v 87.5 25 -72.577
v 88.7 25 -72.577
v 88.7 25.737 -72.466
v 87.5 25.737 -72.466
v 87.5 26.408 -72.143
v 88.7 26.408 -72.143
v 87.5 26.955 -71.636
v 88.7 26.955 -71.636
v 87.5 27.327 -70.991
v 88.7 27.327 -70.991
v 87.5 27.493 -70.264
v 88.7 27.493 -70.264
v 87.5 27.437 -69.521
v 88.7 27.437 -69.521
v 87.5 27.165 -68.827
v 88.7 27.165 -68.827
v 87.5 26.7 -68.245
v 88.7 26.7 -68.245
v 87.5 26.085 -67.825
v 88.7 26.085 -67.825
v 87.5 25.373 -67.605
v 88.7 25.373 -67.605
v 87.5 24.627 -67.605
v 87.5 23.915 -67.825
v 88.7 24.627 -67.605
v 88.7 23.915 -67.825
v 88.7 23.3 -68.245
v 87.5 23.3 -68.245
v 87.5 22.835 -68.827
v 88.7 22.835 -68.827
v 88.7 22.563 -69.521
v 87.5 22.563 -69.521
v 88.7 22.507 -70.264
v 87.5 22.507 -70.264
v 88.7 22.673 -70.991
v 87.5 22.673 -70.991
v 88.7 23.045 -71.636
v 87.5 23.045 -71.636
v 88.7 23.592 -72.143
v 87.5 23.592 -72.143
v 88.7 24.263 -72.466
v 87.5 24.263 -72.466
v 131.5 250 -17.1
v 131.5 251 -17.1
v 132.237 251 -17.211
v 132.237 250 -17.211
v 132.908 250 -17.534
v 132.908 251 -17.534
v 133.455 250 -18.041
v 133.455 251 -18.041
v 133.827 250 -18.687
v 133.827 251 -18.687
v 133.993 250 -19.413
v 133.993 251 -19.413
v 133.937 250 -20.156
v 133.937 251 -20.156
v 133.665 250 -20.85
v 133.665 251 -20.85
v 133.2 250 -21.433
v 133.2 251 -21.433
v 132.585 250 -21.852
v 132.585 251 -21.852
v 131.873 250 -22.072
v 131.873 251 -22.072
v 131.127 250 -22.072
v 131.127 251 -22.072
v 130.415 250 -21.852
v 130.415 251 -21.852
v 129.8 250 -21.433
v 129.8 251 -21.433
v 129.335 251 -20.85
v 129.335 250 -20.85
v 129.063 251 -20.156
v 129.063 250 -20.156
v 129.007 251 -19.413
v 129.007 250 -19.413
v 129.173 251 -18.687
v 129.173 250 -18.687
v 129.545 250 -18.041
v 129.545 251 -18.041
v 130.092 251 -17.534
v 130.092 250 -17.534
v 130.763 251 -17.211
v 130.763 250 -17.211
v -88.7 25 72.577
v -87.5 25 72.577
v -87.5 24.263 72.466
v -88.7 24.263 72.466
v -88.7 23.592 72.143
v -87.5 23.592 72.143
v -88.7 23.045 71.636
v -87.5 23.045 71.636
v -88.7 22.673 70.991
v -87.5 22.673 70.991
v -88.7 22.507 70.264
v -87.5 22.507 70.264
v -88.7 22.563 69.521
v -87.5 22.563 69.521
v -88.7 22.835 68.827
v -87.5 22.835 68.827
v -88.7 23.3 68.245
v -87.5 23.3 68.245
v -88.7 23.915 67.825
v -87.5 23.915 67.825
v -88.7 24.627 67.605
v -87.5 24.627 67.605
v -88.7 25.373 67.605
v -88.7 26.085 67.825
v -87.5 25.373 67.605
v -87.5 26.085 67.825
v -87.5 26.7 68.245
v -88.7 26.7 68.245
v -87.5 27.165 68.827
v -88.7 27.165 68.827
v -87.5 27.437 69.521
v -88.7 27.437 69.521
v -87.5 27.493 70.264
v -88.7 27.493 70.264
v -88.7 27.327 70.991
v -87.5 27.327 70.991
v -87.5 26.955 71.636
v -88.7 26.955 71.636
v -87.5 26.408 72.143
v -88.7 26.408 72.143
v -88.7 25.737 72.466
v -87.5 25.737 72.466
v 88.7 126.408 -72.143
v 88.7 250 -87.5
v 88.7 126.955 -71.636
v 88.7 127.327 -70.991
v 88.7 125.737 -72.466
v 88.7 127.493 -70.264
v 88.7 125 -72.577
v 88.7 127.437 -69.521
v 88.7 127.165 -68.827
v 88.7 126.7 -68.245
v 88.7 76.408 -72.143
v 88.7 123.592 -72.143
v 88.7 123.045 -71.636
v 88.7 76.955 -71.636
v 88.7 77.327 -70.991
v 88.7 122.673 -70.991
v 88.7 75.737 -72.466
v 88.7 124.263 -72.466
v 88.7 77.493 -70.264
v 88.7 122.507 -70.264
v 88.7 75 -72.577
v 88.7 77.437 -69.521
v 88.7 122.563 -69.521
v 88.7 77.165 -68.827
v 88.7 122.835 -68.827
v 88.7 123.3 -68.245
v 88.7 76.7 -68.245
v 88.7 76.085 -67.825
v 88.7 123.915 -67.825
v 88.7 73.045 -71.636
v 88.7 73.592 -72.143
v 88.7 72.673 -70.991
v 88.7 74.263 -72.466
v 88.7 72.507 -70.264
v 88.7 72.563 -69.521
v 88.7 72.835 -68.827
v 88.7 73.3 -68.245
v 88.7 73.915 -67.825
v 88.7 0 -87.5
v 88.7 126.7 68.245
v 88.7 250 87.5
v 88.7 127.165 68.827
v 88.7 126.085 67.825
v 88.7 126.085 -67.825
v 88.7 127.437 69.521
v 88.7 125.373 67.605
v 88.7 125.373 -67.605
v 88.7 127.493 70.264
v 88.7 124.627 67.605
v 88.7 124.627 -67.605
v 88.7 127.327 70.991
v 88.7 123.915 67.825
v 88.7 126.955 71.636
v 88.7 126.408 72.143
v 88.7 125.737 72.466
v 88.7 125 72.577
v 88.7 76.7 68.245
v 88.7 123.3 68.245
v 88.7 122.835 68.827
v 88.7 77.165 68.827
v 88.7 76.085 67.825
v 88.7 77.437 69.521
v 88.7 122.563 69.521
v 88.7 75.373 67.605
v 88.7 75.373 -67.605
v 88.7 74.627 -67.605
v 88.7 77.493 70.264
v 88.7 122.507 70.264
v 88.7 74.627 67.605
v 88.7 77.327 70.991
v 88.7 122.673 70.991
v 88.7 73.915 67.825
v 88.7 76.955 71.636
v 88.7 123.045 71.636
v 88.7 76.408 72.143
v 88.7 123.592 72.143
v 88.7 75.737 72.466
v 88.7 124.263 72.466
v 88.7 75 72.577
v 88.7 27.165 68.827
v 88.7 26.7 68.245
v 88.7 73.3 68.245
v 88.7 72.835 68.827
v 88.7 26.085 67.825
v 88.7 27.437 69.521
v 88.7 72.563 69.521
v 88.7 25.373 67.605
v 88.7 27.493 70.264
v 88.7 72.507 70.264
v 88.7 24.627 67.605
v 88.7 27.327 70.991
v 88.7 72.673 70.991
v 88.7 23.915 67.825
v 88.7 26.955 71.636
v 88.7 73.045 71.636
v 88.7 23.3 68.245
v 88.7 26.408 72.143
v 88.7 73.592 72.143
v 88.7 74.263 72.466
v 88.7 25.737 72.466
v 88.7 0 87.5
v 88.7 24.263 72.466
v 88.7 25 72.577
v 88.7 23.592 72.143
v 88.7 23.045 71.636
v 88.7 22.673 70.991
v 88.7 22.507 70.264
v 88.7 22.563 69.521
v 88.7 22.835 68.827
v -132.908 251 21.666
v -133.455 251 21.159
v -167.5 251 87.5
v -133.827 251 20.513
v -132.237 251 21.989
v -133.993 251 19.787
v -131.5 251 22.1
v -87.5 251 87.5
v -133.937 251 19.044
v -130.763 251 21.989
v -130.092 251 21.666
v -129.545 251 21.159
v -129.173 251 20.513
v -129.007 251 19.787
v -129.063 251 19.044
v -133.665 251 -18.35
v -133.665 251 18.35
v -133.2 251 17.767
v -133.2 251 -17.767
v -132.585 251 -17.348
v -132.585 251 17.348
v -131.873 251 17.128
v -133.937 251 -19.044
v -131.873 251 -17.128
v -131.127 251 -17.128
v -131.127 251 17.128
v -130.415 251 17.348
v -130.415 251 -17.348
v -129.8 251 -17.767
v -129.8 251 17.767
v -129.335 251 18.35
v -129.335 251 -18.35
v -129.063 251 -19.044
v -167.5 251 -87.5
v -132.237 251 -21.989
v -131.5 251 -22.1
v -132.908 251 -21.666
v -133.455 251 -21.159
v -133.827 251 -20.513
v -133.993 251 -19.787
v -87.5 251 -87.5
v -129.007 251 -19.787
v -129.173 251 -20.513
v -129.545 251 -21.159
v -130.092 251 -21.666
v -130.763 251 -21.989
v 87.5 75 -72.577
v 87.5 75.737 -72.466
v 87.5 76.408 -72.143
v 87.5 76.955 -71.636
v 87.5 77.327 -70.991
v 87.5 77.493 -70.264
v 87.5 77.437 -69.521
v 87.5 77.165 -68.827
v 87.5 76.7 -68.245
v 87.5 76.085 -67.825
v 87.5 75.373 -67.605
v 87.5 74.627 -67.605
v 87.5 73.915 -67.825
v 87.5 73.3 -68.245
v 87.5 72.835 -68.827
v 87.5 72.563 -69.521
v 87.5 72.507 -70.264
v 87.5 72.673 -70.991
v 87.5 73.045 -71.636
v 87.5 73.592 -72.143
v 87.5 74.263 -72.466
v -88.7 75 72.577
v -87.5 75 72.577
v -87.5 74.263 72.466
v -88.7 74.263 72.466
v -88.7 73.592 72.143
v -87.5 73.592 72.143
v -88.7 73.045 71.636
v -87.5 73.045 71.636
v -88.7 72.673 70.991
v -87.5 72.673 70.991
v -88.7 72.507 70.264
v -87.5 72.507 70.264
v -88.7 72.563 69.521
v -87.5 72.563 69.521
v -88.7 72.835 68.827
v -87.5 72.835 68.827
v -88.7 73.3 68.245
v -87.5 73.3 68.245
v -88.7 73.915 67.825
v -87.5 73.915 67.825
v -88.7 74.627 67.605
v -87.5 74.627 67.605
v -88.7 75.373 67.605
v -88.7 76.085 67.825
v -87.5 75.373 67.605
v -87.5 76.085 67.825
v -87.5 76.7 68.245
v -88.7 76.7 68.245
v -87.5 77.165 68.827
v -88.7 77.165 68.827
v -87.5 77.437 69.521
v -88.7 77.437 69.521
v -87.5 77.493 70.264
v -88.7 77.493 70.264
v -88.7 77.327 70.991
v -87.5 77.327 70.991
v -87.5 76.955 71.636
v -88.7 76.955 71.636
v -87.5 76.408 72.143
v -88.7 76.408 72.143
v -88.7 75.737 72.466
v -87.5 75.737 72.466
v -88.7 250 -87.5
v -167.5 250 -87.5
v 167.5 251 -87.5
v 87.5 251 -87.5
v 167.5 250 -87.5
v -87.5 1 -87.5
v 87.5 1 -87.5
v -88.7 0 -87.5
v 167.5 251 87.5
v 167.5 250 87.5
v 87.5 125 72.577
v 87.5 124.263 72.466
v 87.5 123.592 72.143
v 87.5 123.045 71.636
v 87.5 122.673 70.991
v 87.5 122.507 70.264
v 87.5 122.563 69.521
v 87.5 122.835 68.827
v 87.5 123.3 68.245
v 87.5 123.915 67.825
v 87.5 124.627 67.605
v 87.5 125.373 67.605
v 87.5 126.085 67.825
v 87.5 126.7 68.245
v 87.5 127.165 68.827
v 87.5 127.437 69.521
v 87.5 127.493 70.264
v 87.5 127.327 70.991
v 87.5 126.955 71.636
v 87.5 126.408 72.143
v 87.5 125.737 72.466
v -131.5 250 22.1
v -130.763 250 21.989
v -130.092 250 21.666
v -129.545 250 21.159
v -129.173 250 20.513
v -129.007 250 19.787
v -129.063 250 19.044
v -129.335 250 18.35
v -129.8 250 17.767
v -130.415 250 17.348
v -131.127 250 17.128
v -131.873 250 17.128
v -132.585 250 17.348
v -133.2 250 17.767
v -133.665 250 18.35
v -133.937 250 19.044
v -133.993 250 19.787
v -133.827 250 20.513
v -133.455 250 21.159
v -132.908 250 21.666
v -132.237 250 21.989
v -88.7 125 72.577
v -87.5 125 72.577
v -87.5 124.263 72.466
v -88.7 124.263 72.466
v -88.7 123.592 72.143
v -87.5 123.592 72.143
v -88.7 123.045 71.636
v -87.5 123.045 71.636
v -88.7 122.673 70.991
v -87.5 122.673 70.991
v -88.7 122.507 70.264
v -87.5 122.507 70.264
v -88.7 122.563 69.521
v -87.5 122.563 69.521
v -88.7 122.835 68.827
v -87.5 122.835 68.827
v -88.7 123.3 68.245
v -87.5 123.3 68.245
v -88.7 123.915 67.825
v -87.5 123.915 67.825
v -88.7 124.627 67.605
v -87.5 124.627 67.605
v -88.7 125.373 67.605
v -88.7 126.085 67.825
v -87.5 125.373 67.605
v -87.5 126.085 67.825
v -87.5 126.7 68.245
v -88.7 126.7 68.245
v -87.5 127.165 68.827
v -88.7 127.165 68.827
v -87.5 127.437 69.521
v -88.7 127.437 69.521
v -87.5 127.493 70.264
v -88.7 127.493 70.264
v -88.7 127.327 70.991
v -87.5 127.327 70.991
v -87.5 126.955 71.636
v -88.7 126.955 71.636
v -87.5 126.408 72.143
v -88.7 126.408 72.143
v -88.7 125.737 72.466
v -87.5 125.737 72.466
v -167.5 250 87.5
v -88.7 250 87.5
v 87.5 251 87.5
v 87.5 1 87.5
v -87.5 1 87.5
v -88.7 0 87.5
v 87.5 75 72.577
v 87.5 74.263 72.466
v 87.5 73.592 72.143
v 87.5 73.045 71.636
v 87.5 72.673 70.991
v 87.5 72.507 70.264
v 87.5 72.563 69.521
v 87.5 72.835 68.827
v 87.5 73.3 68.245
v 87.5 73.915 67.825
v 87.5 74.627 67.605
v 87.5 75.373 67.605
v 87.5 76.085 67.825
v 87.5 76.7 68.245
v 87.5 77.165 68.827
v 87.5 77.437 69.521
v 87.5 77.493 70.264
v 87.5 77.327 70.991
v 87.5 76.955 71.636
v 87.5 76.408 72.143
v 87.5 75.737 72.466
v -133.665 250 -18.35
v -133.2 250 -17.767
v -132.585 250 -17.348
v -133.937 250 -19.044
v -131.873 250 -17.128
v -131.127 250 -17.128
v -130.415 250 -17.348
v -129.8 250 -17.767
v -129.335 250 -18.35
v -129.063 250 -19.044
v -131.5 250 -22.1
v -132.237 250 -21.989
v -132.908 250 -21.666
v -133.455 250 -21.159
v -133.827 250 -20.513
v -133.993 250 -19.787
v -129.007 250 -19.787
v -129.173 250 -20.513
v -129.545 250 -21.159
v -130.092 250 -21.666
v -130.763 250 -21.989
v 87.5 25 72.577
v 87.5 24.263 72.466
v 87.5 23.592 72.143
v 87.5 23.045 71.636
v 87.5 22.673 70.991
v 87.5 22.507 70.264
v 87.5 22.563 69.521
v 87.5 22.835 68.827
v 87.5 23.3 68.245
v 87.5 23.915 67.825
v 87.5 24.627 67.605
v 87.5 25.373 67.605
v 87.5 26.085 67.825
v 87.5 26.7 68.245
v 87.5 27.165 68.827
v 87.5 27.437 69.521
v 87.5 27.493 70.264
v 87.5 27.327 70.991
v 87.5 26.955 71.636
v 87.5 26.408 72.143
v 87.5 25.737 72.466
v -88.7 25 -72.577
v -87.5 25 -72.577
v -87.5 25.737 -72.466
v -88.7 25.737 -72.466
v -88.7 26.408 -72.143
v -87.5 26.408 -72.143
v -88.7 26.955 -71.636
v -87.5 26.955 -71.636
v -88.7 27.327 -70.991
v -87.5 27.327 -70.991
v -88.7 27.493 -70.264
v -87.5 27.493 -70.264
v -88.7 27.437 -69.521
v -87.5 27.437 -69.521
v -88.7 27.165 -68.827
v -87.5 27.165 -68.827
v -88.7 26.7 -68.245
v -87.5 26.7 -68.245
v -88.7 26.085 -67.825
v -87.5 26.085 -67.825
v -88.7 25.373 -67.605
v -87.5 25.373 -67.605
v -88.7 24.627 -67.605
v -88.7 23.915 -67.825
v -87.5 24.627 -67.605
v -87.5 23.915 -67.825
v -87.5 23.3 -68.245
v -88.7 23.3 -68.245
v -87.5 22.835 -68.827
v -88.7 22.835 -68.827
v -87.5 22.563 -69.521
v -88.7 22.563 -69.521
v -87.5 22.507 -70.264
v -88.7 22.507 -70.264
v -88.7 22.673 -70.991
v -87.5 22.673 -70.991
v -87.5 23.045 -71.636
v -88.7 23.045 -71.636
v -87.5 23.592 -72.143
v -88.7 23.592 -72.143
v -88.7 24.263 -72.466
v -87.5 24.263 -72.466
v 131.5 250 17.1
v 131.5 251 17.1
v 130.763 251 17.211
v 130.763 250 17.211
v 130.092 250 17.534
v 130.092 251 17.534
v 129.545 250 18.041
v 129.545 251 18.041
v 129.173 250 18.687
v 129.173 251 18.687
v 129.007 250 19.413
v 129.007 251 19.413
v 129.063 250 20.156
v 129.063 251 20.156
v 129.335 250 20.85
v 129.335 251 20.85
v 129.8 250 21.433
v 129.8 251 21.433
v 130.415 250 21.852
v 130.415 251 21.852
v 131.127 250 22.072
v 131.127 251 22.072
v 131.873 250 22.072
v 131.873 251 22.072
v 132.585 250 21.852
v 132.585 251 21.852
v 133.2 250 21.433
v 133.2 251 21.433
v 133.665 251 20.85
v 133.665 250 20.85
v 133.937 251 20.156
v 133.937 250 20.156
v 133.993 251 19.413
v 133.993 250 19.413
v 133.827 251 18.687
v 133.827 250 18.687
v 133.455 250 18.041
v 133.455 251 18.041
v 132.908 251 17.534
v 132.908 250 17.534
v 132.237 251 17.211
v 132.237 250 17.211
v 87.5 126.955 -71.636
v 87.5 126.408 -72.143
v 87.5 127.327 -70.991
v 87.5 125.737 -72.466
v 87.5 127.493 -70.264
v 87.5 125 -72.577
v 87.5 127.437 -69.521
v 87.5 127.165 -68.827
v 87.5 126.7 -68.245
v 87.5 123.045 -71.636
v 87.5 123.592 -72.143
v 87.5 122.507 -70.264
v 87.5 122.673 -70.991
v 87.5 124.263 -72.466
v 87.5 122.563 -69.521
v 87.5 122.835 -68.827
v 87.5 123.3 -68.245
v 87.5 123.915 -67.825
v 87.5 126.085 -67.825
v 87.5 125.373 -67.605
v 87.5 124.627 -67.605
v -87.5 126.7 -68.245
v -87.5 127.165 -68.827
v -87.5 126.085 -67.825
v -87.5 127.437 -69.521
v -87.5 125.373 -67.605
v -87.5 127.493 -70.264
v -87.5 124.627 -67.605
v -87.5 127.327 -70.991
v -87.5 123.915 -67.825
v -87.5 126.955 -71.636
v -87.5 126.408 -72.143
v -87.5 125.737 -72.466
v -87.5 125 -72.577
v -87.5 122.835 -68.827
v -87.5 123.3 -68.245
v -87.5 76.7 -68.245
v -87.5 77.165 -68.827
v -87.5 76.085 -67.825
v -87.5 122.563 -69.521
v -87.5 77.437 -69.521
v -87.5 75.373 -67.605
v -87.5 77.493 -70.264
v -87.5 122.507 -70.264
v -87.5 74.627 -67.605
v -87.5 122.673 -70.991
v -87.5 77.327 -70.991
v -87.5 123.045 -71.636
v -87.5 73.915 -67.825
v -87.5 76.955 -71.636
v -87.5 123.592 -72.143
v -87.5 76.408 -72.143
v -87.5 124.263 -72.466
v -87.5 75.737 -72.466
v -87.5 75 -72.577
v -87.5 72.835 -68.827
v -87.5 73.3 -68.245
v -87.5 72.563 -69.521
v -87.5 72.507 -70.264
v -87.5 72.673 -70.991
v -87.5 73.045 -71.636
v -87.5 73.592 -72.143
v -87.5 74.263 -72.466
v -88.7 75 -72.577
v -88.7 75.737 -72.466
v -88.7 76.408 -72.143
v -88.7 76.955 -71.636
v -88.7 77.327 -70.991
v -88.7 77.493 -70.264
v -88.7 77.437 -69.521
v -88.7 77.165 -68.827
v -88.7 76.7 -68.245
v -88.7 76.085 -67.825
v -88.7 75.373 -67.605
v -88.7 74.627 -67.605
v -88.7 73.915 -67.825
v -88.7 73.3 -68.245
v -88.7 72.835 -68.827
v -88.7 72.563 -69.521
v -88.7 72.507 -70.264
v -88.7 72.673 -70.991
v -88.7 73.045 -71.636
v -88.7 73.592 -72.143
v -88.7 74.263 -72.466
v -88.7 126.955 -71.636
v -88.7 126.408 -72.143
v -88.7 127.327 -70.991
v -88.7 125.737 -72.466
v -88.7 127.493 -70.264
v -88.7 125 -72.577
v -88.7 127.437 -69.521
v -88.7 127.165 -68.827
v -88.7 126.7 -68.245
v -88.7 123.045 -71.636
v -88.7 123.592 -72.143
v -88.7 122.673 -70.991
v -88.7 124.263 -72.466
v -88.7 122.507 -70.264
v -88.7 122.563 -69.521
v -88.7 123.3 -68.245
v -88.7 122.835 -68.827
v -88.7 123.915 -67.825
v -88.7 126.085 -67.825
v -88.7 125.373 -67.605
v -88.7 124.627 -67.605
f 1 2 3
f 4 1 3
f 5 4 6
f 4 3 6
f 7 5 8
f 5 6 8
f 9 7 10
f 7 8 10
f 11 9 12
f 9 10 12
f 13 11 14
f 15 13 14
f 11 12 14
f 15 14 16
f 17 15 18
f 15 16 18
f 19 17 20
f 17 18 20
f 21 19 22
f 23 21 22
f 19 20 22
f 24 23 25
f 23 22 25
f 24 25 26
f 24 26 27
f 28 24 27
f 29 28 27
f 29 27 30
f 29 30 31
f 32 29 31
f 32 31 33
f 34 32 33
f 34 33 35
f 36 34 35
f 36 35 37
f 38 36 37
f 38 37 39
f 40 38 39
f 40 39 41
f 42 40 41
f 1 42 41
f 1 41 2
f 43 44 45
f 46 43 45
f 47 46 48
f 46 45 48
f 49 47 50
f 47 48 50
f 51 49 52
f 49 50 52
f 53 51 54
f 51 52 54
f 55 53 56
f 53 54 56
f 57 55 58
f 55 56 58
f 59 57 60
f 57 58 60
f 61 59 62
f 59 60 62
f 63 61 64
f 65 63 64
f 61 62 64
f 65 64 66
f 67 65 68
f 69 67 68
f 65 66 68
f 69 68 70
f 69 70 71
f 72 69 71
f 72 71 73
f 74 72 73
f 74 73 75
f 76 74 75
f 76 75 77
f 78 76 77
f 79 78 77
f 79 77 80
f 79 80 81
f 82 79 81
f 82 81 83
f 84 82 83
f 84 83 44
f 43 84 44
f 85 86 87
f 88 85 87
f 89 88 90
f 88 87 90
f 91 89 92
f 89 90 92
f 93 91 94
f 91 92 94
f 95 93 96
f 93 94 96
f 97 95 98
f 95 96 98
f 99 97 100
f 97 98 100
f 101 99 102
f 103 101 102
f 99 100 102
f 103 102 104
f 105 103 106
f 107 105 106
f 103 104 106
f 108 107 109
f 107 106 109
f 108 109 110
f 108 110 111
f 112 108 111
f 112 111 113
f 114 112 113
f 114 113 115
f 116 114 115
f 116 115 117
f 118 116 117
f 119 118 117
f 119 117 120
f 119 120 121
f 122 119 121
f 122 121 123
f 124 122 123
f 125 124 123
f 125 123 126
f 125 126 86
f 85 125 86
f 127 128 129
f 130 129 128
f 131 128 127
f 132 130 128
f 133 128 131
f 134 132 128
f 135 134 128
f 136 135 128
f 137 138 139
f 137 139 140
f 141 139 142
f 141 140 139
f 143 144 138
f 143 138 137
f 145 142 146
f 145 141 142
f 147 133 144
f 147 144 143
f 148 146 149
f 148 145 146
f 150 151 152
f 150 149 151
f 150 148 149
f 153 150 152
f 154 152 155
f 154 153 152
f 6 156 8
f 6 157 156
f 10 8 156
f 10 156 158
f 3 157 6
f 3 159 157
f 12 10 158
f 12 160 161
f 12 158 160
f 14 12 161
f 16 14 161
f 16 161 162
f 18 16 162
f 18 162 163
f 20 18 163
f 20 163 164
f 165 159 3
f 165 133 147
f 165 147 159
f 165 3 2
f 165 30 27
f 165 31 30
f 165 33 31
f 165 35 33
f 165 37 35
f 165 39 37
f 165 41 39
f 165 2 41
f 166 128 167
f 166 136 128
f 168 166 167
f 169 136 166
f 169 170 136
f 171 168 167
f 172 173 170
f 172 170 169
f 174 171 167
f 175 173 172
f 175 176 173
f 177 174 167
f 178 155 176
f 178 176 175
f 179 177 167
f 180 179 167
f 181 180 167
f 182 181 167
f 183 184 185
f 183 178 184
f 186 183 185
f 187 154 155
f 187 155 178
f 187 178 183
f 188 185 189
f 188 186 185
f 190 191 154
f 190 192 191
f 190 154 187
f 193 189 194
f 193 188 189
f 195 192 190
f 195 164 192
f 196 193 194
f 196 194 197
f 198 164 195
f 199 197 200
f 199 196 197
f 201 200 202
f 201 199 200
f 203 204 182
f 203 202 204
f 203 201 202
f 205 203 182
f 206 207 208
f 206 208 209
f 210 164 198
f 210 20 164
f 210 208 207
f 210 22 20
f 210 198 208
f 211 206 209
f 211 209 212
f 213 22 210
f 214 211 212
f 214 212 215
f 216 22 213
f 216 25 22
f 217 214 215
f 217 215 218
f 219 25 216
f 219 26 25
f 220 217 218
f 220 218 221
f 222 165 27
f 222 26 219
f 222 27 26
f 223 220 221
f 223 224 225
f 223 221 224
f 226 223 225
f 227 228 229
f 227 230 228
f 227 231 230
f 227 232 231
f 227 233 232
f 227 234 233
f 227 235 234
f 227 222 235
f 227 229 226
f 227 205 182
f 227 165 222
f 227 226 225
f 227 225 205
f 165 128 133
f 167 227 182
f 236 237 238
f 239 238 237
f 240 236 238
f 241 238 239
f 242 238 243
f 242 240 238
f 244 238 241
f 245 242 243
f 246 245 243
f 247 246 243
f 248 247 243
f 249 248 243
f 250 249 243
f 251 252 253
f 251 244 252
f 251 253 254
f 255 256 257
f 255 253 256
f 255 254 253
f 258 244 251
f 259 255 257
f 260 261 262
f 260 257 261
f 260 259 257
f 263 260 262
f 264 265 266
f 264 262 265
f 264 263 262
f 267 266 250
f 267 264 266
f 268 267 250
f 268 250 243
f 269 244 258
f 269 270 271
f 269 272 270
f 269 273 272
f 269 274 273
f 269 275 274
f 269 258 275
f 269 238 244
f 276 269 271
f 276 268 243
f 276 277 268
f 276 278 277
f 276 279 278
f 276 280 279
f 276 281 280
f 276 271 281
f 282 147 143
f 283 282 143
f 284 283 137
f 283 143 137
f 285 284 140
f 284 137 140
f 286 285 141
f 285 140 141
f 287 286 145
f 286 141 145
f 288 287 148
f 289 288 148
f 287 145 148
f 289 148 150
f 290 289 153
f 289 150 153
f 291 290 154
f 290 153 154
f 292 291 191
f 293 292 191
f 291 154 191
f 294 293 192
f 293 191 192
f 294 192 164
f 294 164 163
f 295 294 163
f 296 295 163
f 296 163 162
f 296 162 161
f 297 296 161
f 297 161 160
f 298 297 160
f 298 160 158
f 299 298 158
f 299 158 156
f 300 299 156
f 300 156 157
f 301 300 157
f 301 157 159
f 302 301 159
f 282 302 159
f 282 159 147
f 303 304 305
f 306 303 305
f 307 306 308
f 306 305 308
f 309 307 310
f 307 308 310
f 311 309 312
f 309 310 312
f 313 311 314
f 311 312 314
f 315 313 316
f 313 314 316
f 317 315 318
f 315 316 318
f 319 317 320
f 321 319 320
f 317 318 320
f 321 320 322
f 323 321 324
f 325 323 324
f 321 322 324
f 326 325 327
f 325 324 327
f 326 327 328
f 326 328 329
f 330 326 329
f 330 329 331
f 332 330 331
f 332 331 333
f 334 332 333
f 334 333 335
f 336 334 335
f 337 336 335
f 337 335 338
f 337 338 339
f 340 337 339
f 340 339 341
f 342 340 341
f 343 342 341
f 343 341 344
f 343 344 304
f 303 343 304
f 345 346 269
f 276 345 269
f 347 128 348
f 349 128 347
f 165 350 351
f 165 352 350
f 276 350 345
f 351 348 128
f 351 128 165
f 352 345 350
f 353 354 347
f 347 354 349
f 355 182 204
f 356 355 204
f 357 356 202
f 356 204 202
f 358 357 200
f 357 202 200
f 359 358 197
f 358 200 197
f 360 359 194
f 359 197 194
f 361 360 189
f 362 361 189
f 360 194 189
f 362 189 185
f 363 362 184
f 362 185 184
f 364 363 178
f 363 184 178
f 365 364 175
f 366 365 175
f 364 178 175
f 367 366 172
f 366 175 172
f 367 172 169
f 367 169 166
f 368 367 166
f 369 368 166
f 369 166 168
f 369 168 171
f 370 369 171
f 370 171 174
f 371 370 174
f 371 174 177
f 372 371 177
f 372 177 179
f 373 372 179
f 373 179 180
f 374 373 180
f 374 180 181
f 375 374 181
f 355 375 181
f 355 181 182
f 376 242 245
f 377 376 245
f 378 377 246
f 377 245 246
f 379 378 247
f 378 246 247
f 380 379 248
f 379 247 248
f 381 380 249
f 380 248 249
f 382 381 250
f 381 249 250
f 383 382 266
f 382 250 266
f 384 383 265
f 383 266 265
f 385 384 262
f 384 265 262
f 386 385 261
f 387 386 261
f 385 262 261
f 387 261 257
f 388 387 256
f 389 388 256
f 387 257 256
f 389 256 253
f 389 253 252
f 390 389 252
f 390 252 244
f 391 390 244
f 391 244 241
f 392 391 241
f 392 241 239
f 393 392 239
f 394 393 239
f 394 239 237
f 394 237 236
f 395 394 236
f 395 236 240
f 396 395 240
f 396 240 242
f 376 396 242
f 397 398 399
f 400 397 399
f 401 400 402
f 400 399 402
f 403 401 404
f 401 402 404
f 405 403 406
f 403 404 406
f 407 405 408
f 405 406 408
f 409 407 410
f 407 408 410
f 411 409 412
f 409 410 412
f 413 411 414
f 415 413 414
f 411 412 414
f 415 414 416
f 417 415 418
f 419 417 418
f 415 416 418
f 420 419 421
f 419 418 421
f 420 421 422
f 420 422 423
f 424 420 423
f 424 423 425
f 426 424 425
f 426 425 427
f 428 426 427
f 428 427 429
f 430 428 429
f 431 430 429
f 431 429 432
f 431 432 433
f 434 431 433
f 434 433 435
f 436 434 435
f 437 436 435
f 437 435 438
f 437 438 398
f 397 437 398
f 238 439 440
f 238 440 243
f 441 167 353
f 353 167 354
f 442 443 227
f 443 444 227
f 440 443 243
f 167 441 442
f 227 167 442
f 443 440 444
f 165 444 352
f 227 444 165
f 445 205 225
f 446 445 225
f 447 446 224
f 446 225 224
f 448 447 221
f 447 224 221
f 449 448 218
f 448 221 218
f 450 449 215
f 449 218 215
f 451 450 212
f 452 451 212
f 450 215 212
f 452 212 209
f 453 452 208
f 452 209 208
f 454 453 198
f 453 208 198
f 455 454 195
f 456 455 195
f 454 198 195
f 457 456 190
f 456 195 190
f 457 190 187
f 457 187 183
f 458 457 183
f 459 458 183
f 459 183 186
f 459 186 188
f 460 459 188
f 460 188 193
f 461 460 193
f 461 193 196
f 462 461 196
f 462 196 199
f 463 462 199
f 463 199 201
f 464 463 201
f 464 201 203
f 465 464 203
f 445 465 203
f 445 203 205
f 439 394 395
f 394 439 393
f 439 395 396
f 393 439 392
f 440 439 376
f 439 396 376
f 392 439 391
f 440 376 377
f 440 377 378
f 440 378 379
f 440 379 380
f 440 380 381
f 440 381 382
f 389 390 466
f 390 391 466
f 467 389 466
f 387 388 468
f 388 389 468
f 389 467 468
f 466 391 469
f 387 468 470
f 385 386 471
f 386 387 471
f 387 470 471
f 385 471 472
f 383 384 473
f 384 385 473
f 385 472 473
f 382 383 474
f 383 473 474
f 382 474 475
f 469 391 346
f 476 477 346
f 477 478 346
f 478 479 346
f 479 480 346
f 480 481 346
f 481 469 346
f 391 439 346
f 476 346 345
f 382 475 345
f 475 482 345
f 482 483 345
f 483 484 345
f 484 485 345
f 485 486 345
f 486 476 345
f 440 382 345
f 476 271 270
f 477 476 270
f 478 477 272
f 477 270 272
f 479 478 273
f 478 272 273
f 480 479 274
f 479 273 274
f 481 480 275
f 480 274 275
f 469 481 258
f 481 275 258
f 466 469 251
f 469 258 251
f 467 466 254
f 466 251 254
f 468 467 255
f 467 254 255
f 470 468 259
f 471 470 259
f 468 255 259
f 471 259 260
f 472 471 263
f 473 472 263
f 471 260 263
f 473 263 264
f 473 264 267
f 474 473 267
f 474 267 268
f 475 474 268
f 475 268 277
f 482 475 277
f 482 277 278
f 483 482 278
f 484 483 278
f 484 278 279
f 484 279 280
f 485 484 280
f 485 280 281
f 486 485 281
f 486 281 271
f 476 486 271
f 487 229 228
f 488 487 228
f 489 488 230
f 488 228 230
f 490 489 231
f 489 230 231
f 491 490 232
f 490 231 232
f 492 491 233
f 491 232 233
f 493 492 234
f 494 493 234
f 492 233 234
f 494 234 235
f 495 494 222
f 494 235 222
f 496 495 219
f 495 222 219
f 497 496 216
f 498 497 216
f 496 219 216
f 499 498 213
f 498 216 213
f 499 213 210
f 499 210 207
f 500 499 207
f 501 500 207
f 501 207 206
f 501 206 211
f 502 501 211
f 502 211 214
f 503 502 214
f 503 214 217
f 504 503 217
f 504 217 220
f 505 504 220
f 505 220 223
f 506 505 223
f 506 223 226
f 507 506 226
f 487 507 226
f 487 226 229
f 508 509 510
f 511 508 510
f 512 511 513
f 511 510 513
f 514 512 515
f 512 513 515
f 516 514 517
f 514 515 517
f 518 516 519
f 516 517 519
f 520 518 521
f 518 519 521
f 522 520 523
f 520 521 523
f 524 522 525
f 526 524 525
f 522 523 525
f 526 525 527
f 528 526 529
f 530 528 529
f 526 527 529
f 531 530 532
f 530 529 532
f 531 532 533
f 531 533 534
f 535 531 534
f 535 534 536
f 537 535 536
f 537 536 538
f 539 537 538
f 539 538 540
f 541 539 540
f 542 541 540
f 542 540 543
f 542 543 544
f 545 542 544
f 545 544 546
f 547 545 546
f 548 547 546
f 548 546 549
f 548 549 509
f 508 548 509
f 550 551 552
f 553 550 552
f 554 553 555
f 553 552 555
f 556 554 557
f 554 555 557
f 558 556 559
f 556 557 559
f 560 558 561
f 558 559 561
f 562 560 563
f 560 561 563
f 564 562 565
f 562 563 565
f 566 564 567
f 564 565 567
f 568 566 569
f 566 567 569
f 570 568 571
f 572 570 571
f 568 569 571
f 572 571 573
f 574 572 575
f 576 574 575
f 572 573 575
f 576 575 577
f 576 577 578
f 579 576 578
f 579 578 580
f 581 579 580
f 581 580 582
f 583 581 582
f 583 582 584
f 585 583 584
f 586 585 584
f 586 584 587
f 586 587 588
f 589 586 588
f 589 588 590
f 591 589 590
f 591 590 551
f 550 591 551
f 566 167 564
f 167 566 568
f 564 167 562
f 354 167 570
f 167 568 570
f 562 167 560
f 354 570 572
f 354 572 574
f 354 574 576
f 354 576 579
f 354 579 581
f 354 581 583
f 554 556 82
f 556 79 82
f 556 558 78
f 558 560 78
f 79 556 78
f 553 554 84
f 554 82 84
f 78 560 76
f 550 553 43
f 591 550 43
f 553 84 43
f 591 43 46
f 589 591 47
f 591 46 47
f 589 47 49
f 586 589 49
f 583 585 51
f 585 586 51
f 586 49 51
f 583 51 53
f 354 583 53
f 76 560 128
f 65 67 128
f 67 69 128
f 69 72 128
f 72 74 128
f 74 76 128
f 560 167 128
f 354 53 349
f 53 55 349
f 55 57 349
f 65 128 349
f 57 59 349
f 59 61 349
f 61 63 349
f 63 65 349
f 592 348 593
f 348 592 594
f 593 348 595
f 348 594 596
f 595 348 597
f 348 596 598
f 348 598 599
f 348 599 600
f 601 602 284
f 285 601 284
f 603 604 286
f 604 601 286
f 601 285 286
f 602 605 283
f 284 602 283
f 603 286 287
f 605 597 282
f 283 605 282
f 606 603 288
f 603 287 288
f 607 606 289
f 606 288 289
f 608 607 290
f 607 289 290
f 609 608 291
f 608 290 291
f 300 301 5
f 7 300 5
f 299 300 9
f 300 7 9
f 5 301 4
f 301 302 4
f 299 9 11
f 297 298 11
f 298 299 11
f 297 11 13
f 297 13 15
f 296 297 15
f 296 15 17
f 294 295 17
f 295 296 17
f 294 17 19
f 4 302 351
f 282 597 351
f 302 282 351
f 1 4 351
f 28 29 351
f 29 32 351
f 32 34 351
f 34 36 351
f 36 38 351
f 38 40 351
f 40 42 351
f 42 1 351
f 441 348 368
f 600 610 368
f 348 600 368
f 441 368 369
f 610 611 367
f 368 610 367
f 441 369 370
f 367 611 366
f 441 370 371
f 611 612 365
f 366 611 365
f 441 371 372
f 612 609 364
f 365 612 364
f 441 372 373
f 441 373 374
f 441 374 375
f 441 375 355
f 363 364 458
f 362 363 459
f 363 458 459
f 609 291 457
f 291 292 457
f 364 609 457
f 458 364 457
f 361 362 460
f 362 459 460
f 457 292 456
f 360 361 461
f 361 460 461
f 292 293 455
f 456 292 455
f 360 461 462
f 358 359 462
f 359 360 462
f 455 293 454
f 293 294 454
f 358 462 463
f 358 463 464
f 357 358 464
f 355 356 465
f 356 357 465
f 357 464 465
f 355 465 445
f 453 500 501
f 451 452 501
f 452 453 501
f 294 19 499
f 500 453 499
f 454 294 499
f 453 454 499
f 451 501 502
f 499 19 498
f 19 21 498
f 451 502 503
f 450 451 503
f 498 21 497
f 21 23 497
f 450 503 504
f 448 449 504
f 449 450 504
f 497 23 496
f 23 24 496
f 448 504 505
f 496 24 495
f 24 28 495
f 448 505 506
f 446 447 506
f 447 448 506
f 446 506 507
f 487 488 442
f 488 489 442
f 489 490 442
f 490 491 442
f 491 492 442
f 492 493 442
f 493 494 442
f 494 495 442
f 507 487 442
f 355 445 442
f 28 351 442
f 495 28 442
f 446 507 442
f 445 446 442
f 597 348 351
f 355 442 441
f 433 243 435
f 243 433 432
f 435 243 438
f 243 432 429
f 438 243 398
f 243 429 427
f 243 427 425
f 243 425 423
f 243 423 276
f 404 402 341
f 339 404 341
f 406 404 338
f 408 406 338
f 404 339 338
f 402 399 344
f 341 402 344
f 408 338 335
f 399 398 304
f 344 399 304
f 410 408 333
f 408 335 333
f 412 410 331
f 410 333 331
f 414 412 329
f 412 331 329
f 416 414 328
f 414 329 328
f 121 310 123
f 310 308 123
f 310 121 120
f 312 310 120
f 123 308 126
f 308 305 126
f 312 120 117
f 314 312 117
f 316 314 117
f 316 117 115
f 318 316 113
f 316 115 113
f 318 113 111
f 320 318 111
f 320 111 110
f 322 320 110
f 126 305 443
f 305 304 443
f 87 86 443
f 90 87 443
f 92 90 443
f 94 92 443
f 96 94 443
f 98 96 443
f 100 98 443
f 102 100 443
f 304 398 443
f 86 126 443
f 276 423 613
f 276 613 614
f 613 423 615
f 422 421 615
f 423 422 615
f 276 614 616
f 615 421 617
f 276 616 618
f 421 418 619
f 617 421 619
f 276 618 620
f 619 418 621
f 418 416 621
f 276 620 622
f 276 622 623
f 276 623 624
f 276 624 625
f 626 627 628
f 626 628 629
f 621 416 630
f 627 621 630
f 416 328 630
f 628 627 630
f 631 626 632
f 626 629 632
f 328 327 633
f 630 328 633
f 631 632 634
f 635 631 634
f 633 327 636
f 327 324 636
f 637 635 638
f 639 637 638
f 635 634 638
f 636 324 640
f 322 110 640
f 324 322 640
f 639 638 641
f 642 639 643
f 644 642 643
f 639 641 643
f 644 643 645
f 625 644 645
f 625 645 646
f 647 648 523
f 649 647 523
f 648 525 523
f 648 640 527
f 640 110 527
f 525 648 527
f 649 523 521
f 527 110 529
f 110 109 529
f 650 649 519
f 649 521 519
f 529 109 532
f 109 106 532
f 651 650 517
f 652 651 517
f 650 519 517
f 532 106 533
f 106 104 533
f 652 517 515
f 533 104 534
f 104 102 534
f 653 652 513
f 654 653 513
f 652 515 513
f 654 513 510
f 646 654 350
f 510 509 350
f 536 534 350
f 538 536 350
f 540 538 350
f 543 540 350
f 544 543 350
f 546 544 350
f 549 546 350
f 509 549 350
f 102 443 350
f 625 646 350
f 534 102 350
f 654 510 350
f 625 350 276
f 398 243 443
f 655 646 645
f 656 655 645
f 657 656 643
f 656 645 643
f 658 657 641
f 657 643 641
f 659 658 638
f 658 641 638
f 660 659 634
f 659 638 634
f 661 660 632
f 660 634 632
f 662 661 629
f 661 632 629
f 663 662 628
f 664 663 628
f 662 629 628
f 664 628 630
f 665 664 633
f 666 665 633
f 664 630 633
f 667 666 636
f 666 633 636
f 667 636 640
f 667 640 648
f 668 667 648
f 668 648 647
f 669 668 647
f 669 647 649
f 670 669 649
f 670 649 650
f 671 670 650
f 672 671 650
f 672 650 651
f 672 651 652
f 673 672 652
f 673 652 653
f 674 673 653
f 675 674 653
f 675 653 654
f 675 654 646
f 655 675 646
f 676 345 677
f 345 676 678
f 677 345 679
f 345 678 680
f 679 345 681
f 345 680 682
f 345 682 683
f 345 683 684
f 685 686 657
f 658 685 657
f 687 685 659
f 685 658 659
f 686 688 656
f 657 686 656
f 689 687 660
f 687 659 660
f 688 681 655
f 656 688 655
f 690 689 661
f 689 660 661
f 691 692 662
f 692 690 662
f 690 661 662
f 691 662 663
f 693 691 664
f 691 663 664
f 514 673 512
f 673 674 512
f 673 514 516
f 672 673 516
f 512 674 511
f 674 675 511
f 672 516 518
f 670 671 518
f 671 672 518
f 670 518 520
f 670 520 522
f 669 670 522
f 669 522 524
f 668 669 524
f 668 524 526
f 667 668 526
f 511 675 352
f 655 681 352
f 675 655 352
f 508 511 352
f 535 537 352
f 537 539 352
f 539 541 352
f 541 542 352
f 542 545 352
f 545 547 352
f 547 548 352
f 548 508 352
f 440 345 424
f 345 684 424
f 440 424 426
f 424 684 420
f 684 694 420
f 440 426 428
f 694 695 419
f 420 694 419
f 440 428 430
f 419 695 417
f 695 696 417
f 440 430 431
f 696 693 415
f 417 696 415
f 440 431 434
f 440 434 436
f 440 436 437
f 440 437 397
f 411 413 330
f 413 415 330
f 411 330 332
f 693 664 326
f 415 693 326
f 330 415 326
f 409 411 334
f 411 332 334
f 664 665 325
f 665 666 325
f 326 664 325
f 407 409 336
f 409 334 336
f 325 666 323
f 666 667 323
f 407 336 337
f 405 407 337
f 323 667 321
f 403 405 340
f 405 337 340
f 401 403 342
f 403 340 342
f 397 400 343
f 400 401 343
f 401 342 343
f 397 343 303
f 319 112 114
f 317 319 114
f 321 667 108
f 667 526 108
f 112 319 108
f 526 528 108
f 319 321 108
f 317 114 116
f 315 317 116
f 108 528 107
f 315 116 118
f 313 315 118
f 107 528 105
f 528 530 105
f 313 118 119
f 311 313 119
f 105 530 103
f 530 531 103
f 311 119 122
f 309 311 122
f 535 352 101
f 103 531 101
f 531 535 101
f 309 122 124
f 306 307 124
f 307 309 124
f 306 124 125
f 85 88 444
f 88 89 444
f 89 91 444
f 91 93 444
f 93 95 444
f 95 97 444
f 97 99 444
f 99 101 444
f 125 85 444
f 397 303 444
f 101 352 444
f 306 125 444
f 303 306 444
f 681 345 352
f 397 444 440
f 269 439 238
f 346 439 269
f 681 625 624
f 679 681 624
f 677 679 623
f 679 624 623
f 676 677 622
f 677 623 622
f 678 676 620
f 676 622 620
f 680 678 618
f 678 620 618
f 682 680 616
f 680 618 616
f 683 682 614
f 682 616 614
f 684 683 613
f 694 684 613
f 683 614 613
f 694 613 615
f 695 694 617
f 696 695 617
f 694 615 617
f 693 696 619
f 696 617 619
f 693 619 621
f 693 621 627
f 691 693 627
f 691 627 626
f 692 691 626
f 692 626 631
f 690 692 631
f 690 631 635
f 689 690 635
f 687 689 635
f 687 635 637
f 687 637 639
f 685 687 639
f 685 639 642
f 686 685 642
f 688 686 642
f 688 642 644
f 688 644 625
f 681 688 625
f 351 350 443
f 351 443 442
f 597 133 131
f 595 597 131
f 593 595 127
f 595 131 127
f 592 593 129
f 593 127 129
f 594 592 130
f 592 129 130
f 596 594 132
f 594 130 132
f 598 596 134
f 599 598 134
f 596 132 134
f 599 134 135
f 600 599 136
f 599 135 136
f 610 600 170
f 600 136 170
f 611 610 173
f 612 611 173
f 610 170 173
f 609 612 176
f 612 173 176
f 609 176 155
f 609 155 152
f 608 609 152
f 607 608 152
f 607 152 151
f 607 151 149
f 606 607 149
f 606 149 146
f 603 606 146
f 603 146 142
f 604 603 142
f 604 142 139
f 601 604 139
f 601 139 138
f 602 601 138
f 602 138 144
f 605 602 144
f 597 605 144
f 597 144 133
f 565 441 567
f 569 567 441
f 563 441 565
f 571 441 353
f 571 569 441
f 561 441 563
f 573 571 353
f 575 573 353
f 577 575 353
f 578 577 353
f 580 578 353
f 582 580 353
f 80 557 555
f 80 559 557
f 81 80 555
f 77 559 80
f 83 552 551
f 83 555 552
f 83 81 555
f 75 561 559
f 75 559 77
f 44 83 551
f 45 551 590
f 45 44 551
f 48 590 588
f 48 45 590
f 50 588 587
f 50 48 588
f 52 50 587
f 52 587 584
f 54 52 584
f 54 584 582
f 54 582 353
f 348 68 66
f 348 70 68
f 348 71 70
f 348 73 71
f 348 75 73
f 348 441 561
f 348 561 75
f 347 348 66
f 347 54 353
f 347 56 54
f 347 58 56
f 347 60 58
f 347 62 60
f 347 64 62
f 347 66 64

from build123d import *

# Parameters (mm, degrees)
SKETCH1_W           = 175
SKETCH1_H           = 175
BOSS_EXTRUDE1_DEPTH = 1
SKETCH2_W           = 1.2
SKETCH2_H           = 175
BOSS_EXTRUDE2_DEPTH = 250
SKETCH3_W           = 80
SKETCH3_H           = 175
BOSS_EXTRUDE3_DEPTH = 1
SKETCH4_R           = 2.5
CUT_EXTRUDE1_DEPTH  = 10
SKETCH6_R           = 2.5
CUT_EXTRUDE2_DEPTH  = 300


with BuildPart() as part:
    # Sketch1 → Boss-Extrude1 (new body)
    with BuildSketch(Plane(origin=(0, 0, 0), x_dir=(1, 0, 0), z_dir=(0, 1, 0))):
        Rectangle(SKETCH1_W, SKETCH1_H)
    extrude(amount=BOSS_EXTRUDE1_DEPTH)

    # Sketch2 → Boss-Extrude2 (add)
    with BuildSketch(Plane.XZ):
        with Locations((-88.1, 0)):
            Rectangle(SKETCH2_W, SKETCH2_H)
        with Locations((88.1, 0)):
            Rectangle(SKETCH2_W, SKETCH2_H)
    extrude(amount=-BOSS_EXTRUDE2_DEPTH)

    # Sketch3 → Boss-Extrude3 (add)
    with BuildSketch(Plane(origin=(0, 250, 0), x_dir=(1, 0, 0), z_dir=(0, 1, 0))):
        with Locations((-127.5, 0)):
            Rectangle(SKETCH3_W, SKETCH3_H)
        with Locations((127.5, 0)):
            Rectangle(SKETCH3_W, SKETCH3_H)
    extrude(amount=BOSS_EXTRUDE3_DEPTH)

    # Sketch4 → Cut-Extrude1 (cut)
    with BuildSketch(Plane(origin=(0, 251, 0), x_dir=(1, 0, 0), z_dir=(0, 1, 0))):
        with Locations(Location((131.5, 19.6, 0), (0, 0, 270))):
            Circle(SKETCH4_R)
        with Locations(Location((131.5, -19.6, 0), (0, 0, 90))):
            Circle(SKETCH4_R)
        with Locations(Location((-131.5, -19.6, 0), (0, 0, 270))):
            Circle(SKETCH4_R)
        with Locations(Location((-131.5, 19.6, 0), (0, 0, 90))):
            Circle(SKETCH4_R)
    extrude(amount=-CUT_EXTRUDE1_DEPTH, mode=Mode.SUBTRACT)

    # Sketch6 → Cut-Extrude2 (cut)
    with BuildSketch(Plane(origin=(88.7, 0, 0), x_dir=(0, 0, -1), z_dir=(1, 0, 0))):
        with Locations((70.077336333, 25)):
            Circle(SKETCH6_R)
        with Locations((70.077336333, 75)):
            Circle(SKETCH6_R)
        with Locations((70.077336333, 125)):
            Circle(SKETCH6_R)
        with Locations(Location((-70.077336333, 125, 0), (0, 0, 180))):
            Circle(SKETCH6_R)
        with Locations(Location((-70.077336333, 75, 0), (0, 0, 180))):
            Circle(SKETCH6_R)
        with Locations(Location((-70.077336333, 25, 0), (0, 0, 180))):
            Circle(SKETCH6_R)
    extrude(amount=-CUT_EXTRUDE2_DEPTH, mode=Mode.SUBTRACT)


solid = part.part
